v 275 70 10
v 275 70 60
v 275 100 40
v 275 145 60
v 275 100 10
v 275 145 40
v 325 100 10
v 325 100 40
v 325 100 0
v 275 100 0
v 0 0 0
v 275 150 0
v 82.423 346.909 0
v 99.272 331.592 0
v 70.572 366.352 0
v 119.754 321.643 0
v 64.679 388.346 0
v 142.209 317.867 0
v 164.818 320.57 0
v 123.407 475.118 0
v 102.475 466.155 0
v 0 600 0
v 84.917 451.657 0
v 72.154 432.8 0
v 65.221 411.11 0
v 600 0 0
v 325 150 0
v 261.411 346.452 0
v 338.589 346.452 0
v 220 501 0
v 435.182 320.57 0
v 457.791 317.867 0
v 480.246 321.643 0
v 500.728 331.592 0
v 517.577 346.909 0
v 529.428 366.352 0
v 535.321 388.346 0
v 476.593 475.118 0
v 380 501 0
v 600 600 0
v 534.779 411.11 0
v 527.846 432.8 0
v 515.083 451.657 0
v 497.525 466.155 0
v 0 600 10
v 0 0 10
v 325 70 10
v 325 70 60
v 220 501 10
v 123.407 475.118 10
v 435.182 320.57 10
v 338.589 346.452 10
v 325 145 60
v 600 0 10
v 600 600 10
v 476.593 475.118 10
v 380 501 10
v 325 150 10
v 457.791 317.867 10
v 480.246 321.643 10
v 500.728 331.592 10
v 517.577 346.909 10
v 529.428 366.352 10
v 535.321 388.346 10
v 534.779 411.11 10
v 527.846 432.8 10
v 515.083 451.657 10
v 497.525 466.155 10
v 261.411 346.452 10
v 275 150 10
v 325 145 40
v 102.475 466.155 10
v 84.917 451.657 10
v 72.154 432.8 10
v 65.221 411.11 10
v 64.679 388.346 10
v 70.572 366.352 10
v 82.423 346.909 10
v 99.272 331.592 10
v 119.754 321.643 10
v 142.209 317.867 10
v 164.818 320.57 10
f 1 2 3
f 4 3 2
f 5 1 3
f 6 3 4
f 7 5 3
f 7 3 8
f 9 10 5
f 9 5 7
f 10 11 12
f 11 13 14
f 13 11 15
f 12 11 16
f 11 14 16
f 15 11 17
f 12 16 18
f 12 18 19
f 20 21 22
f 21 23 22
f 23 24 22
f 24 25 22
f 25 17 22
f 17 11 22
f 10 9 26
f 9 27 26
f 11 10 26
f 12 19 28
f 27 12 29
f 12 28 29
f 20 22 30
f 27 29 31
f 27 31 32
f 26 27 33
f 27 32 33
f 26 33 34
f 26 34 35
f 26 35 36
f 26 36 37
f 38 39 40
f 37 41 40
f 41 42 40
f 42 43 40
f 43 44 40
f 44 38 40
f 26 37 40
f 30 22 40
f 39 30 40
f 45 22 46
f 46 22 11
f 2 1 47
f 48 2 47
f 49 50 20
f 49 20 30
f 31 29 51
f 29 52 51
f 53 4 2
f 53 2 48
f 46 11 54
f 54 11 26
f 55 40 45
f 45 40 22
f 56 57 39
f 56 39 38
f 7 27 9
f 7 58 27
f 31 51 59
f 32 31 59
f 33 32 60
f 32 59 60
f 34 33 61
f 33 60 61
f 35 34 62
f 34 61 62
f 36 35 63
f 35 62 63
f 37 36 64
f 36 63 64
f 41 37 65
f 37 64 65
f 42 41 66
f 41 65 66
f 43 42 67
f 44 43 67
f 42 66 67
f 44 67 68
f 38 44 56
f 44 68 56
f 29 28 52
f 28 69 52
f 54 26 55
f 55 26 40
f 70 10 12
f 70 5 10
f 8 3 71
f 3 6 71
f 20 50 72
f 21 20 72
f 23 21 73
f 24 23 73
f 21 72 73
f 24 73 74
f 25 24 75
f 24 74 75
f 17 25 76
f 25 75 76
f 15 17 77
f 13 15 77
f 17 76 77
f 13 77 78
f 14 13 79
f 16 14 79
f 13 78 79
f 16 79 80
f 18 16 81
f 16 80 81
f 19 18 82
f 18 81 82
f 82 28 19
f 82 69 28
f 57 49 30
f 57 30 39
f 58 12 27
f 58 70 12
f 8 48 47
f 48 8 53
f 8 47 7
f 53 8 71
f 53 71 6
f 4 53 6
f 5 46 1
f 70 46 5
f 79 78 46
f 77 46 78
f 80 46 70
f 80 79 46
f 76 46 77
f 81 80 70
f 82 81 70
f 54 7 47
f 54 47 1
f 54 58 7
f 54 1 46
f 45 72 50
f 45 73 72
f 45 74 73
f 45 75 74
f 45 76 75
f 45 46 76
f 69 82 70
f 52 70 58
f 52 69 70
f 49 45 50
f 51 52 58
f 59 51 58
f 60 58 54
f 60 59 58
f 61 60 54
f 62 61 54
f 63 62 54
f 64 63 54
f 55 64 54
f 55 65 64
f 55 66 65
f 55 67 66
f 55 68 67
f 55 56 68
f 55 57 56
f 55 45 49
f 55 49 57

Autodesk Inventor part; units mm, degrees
ref_plane "YZ Plane" through (0, 0, 0) normal (1, 0, 0) x (0, 1, 0)
ref_plane "XZ Plane" through (0, 0, 0) normal (0, 1, 0) x (-1, 0, 0)
ref_plane "XY Plane" through (0, 0, 0) normal (0, 0, 1) x (1, 0, 0)
sketch "Sketch1" plane through (0, 0, 0) normal (0, 0, 1) x (1, 0, 0)
  line L0 (0, 0) -> (600, 0)
  line L1 (600, 0) -> (600, 600)
  line L2 (600, 600) -> (0, 600)
  line L3 (0, 600) -> (0, 0)
  dimension "d0" = 600
  dimension "d1" = 600
extrude "Extrusion1" add sketch "Sketch1" along normal blind 10
sketch "Sketch2" plane through (0, 0, 10) normal (0, 0, 1) x (1, 0, 0)
  line L0 (193.5, 368) -> (406.5, 368)
  line L1 (406.5, 368) -> (406.5, 481)
  line L2 (406.5, 481) -> (193.5, 481)
  line L3 (193.5, 481) -> (193.5, 368)
  line L4 (0, 600) -> (0, 0) projected
  line L5 (600, 600) -> (0, 600) projected
  dimension "d4" = 213
  dimension "d5" = 113
  dimension "d6" = 193.5
  dimension "d7" = 119
extrude "Extrusion2" cut sketch "Sketch2" against normal through all
sketch "Sketch3" plane through (0, 0, 10) normal (0, 0, 1) x (1, 0, 0)
  circle A0 centre (144.1129, 397.844) radius 80 construction
  circle A1 centre (455.8871, 397.844) radius 80 construction
  line L0 (220, 501) -> (380, 501)
  line L1 (380, 501) -> (338.589, 346.4519) construction
  line L2 (220, 501) -> (261.411, 346.4519) construction
  line L3 (261.411, 346.4519) -> (338.589, 346.4519)
  line L4 (123.4074, 475.1181) -> (220, 501)
  line L5 (261.411, 346.4519) -> (164.8185, 320.57)
  arc A2 (123.4074, 475.1181) -> (164.8185, 320.57) centre (144.1129, 397.844) ccw
  line L6 (380, 501) -> (476.5926, 475.1181)
  line L7 (338.589, 346.4519) -> (435.1815, 320.57)
  arc A3 (435.1815, 320.57) -> (476.5926, 475.1181) centre (455.8871, 397.844) ccw
  line L8 (193.5, 481) -> (406.5, 481) projected
  point P0 (0, 0)
  point P1 (424.4703, 324.271)
  point P2 (300, 481)
  point P3 (300, 501)
  dimension "d10" = 160
  dimension "d11" = 160
  dimension "d12" = 160
  dimension "d13" = 160
  dimension "d14" = 160
  dimension "d15" = 75
  dimension "d16" = 75
  dimension "d17" = 100
  dimension "d18" = 100
  dimension "d19" = 20
extrude "Extrusion3" cut sketch "Sketch3" against normal through all
sketch "Sketch4" plane through (0, 0, 10) normal (0, 0, 1) x (1, 0, 0)
  line L0 (275, 150) -> (325, 150)
  line L1 (325, 150) -> (325, 100)
  line L2 (325, 100) -> (275, 100)
  line L3 (275, 100) -> (275, 150)
  line L4 (0, 0) -> (600, 0) projected
  point P0 (300, 100)
  point P1 (300, 0)
  dimension "d22" = 50
  dimension "d23" = 50
  dimension "d24" = 100
extrude "Extrusion4" cut sketch "Sketch4" against normal through all
sketch "Sketch5" plane through (0, 0, 10) normal (0, 0, 1) x (1, 0, 0)
  line L0 (275, 100) -> (325, 100)
  line L1 (325, 100) -> (325, 70)
  line L2 (325, 70) -> (275, 70)
  line L3 (275, 70) -> (275, 100)
  point P0 (0, 0)
  dimension "d27" = 50
  dimension "d28" = 30
extrude "Extrusion5" add sketch "Sketch5" along normal blind 30
sketch "Sketch6" plane through (0, 0, 40) normal (0, 0, 1) x (1, 0, 0)
  line L0 (275, 70) -> (275, 100) projected
  line L1 (275, 70) -> (325, 70)
  line L2 (325, 70) -> (325, 145)
  line L3 (325, 145) -> (275, 145)
  line L4 (275, 145) -> (275, 70)
  point P0 (0, 0)
  dimension "d31" = 50
  dimension "d32" = 75
extrude "Extrusion6" add sketch "Sketch6" along normal blind 20
properties part number "Top Cover" material "ABS Plastic"
